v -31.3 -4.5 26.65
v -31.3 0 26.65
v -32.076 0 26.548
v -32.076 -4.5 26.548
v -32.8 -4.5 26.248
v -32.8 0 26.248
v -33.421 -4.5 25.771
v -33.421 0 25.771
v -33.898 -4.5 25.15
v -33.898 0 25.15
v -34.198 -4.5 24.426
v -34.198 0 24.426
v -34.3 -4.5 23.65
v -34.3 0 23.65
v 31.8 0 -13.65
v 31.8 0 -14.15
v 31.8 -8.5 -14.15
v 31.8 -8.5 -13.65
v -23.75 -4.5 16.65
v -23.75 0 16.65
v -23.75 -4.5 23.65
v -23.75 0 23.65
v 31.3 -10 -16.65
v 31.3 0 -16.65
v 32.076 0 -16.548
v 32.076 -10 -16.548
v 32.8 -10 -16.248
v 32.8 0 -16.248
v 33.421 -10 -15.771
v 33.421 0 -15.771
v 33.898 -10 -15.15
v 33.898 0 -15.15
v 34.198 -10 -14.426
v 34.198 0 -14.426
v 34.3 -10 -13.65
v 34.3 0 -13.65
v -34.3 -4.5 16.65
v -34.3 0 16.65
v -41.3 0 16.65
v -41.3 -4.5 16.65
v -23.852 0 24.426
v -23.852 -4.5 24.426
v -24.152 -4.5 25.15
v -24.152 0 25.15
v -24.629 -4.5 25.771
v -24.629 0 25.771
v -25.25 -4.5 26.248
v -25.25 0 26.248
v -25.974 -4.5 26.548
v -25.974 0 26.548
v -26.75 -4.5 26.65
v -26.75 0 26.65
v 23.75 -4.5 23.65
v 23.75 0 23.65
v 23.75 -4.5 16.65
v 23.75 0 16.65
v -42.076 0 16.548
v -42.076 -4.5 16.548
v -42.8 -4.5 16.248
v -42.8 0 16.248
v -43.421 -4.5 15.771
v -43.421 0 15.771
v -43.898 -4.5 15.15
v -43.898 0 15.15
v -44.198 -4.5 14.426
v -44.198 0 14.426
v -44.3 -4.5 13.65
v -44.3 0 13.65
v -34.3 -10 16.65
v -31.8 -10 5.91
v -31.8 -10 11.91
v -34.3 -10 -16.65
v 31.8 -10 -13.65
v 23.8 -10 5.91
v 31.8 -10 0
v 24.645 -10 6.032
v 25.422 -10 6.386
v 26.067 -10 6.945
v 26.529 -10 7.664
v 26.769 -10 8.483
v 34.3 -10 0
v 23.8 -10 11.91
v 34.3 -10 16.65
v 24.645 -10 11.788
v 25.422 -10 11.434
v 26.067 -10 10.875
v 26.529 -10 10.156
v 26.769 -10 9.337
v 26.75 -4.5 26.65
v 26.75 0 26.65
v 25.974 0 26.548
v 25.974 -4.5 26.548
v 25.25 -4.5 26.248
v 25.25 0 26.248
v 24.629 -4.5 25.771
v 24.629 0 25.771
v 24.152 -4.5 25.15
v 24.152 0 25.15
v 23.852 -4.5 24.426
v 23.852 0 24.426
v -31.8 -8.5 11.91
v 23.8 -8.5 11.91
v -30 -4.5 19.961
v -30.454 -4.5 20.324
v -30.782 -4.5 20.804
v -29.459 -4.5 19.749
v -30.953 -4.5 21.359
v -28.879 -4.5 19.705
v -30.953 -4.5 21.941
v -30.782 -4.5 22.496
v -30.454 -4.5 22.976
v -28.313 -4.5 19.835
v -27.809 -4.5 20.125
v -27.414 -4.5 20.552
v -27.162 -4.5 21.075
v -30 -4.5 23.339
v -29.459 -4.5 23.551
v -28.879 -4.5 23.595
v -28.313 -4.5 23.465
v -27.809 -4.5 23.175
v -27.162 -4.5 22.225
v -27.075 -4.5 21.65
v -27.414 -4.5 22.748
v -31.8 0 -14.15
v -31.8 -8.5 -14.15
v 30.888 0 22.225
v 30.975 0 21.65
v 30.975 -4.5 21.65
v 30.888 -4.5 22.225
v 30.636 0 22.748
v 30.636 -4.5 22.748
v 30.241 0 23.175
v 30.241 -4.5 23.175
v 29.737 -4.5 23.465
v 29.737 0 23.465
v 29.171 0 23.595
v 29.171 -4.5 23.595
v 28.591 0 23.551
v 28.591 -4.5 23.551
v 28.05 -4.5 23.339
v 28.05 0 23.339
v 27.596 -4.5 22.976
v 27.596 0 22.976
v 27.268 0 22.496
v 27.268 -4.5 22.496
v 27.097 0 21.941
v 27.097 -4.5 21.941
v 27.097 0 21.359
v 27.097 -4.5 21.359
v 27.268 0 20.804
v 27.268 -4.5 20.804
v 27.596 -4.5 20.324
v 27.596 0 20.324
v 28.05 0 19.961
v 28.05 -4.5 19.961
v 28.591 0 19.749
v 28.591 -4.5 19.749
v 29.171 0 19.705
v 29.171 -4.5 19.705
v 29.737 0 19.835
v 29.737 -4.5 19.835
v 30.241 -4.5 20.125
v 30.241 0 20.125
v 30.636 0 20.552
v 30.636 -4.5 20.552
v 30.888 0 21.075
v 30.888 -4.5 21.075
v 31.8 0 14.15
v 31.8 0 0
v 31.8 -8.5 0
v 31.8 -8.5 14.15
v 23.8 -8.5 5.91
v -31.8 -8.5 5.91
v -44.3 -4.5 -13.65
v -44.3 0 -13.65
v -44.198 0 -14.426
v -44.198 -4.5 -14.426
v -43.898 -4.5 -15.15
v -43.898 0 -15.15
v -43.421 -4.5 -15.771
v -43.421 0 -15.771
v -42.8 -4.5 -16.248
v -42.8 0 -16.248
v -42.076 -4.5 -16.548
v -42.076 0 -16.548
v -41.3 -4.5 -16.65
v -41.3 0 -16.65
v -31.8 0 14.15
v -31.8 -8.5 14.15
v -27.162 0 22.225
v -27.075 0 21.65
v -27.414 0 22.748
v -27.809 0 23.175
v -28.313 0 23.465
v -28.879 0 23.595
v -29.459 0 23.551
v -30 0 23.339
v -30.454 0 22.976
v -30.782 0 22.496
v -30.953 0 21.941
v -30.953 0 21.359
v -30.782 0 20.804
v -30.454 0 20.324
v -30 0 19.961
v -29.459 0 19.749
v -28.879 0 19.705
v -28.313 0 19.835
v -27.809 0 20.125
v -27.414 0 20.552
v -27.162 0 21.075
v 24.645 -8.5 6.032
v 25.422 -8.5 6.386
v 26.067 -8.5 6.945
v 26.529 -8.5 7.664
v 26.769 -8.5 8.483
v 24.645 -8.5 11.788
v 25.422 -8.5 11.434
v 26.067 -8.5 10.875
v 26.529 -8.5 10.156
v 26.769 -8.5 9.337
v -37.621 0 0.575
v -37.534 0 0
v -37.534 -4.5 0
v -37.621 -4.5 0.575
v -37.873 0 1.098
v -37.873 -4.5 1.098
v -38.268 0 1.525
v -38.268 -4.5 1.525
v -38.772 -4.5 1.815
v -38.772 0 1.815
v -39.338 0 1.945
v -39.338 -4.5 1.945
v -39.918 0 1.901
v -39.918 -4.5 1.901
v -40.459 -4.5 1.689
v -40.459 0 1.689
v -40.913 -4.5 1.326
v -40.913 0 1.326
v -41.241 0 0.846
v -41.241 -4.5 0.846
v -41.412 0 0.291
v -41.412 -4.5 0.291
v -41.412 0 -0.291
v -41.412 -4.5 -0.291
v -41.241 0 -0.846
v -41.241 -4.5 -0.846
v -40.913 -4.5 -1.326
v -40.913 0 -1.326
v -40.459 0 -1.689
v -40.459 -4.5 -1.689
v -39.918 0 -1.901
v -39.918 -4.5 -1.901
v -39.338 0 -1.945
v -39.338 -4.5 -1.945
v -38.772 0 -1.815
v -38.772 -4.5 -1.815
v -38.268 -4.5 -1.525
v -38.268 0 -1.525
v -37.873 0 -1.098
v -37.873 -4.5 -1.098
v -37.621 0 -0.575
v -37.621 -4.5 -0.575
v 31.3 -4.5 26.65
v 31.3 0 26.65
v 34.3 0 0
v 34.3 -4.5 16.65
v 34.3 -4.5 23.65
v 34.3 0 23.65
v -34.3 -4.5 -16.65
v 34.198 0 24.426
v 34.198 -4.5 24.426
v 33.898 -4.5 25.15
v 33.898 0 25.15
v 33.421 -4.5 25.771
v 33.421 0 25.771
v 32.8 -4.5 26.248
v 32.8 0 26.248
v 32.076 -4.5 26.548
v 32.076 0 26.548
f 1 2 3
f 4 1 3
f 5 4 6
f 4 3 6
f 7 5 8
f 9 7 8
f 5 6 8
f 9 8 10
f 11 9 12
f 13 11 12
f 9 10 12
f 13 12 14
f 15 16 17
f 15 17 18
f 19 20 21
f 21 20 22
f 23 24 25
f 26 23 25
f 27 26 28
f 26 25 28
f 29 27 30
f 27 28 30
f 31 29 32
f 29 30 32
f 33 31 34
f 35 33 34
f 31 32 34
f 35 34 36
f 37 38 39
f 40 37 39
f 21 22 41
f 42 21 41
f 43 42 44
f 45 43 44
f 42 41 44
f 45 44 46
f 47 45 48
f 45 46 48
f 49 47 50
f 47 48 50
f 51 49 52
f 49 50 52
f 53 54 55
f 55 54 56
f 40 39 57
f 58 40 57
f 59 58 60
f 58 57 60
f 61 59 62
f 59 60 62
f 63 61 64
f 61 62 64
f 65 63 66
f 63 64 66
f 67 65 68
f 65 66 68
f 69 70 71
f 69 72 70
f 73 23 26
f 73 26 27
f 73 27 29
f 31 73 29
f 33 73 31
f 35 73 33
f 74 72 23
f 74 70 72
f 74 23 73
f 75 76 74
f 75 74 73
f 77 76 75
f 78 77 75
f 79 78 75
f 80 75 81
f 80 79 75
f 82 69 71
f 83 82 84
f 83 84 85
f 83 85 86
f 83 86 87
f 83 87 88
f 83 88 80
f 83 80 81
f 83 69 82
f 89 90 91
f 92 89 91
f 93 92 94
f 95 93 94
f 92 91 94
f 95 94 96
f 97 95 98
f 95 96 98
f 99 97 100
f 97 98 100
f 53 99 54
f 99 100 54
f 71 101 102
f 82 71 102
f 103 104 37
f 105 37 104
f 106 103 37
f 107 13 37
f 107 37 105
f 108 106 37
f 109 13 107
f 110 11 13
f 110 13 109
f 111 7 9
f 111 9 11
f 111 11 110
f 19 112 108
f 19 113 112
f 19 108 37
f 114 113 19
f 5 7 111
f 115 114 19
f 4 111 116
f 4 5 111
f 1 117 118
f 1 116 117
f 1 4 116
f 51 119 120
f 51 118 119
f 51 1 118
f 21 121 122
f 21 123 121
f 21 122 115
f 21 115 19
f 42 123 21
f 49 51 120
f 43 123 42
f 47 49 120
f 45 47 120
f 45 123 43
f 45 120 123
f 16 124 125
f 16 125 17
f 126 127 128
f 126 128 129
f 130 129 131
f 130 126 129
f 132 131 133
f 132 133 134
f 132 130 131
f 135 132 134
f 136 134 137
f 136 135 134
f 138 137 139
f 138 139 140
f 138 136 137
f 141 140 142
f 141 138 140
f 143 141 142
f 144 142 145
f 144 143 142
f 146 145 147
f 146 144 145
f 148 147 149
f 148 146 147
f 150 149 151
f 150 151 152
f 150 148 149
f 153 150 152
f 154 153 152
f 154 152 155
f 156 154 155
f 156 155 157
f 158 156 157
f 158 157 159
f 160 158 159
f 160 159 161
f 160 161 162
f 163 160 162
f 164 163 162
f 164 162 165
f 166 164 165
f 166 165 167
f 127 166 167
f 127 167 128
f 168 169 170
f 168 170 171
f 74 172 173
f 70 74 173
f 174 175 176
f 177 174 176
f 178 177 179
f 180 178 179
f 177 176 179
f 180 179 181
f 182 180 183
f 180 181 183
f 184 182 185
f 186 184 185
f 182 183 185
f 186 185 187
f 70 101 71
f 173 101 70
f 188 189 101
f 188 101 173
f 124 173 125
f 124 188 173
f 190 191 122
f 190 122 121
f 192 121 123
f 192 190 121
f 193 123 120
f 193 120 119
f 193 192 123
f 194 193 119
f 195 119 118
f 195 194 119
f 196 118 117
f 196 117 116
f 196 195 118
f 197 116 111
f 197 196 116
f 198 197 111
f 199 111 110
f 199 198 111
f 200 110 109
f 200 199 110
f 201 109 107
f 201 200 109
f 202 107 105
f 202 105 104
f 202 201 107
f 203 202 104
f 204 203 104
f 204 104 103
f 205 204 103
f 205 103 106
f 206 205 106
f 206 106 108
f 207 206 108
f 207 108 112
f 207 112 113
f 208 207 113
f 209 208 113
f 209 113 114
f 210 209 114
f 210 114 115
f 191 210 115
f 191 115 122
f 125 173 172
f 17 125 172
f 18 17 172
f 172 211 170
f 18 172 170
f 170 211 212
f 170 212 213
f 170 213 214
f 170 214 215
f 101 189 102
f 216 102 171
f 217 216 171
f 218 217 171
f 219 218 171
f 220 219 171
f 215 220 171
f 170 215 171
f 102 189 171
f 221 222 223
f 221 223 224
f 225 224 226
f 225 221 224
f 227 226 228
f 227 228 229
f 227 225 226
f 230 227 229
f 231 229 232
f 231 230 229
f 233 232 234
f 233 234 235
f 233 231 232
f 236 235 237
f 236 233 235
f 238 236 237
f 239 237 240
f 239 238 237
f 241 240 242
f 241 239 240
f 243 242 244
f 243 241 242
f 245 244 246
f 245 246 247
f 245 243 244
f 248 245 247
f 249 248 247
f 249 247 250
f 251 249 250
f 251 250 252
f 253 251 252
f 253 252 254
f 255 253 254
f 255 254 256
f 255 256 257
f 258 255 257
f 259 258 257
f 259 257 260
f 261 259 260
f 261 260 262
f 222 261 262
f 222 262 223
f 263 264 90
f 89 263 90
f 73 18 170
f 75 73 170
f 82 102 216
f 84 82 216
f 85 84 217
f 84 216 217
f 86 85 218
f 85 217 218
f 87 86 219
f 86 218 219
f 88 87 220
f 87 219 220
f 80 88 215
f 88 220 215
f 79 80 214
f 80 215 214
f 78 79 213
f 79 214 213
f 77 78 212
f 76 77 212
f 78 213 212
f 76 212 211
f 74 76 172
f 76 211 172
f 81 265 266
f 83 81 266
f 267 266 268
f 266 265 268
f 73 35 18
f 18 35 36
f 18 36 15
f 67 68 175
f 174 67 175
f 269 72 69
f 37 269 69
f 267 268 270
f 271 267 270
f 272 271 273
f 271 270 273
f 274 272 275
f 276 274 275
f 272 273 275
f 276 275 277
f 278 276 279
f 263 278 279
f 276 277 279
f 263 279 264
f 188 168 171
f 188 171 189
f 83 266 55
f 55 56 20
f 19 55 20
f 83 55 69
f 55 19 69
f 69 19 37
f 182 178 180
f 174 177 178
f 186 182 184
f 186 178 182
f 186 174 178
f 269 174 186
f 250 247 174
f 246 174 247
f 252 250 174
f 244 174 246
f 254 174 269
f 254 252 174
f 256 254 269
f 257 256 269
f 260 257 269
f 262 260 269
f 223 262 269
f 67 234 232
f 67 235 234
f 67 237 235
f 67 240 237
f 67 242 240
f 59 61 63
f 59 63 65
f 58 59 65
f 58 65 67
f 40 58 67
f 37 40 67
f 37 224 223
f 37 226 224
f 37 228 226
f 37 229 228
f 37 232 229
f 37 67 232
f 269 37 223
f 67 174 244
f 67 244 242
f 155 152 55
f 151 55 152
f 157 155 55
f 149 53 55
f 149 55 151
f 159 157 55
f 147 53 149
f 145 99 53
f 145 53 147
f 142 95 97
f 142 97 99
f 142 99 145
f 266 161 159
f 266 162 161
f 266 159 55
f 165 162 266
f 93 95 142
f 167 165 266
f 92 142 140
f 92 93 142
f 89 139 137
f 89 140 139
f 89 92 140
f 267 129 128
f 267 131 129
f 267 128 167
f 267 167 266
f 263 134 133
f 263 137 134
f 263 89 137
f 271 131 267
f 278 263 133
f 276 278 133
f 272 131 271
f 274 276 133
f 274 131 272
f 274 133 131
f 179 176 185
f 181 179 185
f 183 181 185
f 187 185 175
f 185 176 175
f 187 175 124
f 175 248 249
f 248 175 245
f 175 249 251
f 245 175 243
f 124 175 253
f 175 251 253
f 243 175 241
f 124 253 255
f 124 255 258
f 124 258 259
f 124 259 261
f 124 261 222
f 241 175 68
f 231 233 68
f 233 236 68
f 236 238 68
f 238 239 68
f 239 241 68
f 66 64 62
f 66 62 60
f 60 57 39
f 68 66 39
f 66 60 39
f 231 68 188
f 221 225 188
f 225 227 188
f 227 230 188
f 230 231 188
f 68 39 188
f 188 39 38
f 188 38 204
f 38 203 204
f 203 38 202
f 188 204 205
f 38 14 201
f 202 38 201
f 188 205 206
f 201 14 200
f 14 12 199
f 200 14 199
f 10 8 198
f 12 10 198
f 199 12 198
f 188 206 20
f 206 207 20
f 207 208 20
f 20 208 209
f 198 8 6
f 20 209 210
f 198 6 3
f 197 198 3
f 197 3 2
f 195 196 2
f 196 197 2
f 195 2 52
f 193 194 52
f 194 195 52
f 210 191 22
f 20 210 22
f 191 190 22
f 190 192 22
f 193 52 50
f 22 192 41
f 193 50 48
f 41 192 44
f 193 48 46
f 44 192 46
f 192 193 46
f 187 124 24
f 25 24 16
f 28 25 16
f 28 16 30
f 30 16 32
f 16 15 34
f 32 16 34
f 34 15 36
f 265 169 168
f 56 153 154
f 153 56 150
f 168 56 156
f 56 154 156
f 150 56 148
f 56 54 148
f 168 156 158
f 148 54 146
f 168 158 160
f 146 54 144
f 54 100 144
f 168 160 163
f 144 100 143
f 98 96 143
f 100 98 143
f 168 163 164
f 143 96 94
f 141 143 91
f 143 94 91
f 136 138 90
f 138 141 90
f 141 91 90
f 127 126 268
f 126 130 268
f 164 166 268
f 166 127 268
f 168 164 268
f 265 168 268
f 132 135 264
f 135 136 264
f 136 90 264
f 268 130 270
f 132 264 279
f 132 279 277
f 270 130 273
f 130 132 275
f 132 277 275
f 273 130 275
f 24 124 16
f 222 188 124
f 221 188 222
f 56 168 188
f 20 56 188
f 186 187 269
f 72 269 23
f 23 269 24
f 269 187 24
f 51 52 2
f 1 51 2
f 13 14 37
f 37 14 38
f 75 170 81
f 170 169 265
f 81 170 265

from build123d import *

# Parameters (mm, degrees)
F0_R     = 1.95
F1_DEPTH = 10
F2_DEPTH = 8.5
F3_R     = 1.95
F4_DEPTH = 5.5
F6_DEPTH = 25


with BuildPart() as f1:
    # F0 (on Front) → F1 (new body)
    with BuildSketch(Plane.XZ):
        with BuildLine():
            Line((-34.3, 23.65), (-34.3, 16.65))
            Line((-34.3, 16.65), (-23.75, 16.65))
            Line((-23.75, 16.65), (-23.75, 23.65))
            ThreePointArc((-23.75, 23.65), (-24.62868, 25.77132), (-26.75, 26.65))
            Line((-26.75, 26.65), (-31.3, 26.65))
            ThreePointArc((-31.3, 26.65), (-33.42132, 25.77132), (-34.3, 23.65))
        make_face()
        with Locations((-29.025, 21.65)):
            Circle(F0_R, mode=Mode.SUBTRACT)
        with BuildLine():
            Line((23.75, 16.65), (34.3, 16.65))
            Line((34.3, 16.65), (34.3, 23.65))
            ThreePointArc((34.3, 23.65), (33.42132, 25.77132), (31.3, 26.65))
            Line((31.3, 26.65), (26.75, 26.65))
            ThreePointArc((26.75, 26.65), (24.62868, 25.77132), (23.75, 23.65))
            Line((23.75, 23.65), (23.75, 16.65))
        make_face()
        with Locations((29.025, 21.65)):
            Circle(F0_R, mode=Mode.SUBTRACT)
        with BuildLine():
            Line((34.3, 16.65), (34.3, 6.1))
            Line((34.3, 6.1), (41.3, 6.1))
            ThreePointArc((41.3, 6.1), (43.42132, 6.97868), (44.3, 9.1))
            Line((44.3, 9.1), (44.3, 13.65))
            ThreePointArc((44.3, 13.65), (43.42132, 15.77132), (41.3, 16.65))
            Line((41.3, 16.65), (34.3, 16.65))
        make_face()
        with Locations((39.3, 11.375)):
            Circle(F0_R, mode=Mode.SUBTRACT)
        with BuildLine():
            Line((-31.8, 11.91), (-31.8, 14.15))
            Line((-31.8, 14.15), (31.8, 14.15))
            Line((31.8, 14.15), (31.8, 0))
            Line((31.8, 0), (34.3, 0))
            Line((34.3, 0), (34.3, 6.1))
            Line((34.3, 6.1), (34.3, 16.65))
            Line((34.3, 16.65), (23.75, 16.65))
            Line((23.75, 16.65), (-23.75, 16.65))
            Line((-23.75, 16.65), (-34.3, 16.65))
            Line((-34.3, 16.65), (-34.3, -16.65))
            Line((-34.3, -16.65), (31.3, -16.65))
            ThreePointArc((31.3, -16.65), (33.42132, -15.77132), (34.3, -13.65))
            Line((34.3, -13.65), (31.8, -13.65))
            Line((31.8, -13.65), (31.8, -14.15))
            Line((31.8, -14.15), (-31.8, -14.15))
            Line((-31.8, -14.15), (-31.8, 5.91))
            Line((-31.8, 5.91), (-31.8, 11.91))
        make_face()
        with BuildLine():
            Line((-41.3, -16.65), (-34.3, -16.65))
            Line((-34.3, -16.65), (-34.3, 16.65))
            Line((-34.3, 16.65), (-41.3, 16.65))
            ThreePointArc((-41.3, 16.65), (-43.42132, 15.77132), (-44.3, 13.65))
            Line((-44.3, 13.65), (-44.3, -13.65))
            ThreePointArc((-44.3, -13.65), (-43.42132, -15.77132), (-41.3, -16.65))
        make_face()
        with Locations((-39.483927, 0)):
            Circle(F0_R, mode=Mode.SUBTRACT)
        with BuildLine():
            Line((31.8, 14.15), (-31.8, 14.15))
            Line((-31.8, 14.15), (-31.8, 11.91))
            Line((-31.8, 11.91), (23.8, 11.91))
            ThreePointArc((23.8, 11.91), (26.8, 8.91), (23.8, 5.91))
            Line((23.8, 5.91), (-31.8, 5.91))
            Line((-31.8, 5.91), (-31.8, -14.15))
            Line((-31.8, -14.15), (31.8, -14.15))
            Line((31.8, -14.15), (31.8, -13.65))
            Line((31.8, -13.65), (31.8, 0))
            Line((31.8, 0), (31.8, 14.15))
        make_face()
    extrude(amount=F1_DEPTH)

    # F0 (on Front) → F2 (cut)
    with BuildSketch(Plane.XZ):
        with BuildLine():
            Line((31.8, 14.15), (-31.8, 14.15))
            Line((-31.8, 14.15), (-31.8, 11.91))
            Line((-31.8, 11.91), (23.8, 11.91))
            ThreePointArc((23.8, 11.91), (26.8, 8.91), (23.8, 5.91))
            Line((23.8, 5.91), (-31.8, 5.91))
            Line((-31.8, 5.91), (-31.8, -14.15))
            Line((-31.8, -14.15), (31.8, -14.15))
            Line((31.8, -14.15), (31.8, -13.65))
            Line((31.8, -13.65), (31.8, 0))
            Line((31.8, 0), (31.8, 14.15))
        make_face()
    extrude(amount=F2_DEPTH, mode=Mode.SUBTRACT)

    # F3 (on face) → F4 (cut)
    with BuildSketch(Plane.XZ.offset(10)):
        with BuildLine():
            ThreePointArc((-31.3, 26.65), (-33.42132, 25.77132), (-34.3, 23.65))
            Line((-34.3, 23.65), (-34.3, 16.65))
            Line((-34.3, 16.65), (-23.75, 16.65))
            Line((-23.75, 16.65), (-23.75, 23.65))
            ThreePointArc((-23.75, 23.65), (-24.62868, 25.77132), (-26.75, 26.65))
            Line((-26.75, 26.65), (-31.3, 26.65))
        make_face()
        with Locations((-29.025, 21.65)):
            Circle(F3_R, mode=Mode.SUBTRACT)
        with BuildLine():
            Line((-34.3, -16.65), (-34.3, 16.65))
            Line((-34.3, 16.65), (-41.3, 16.65))
            ThreePointArc((-41.3, 16.65), (-43.42132, 15.77132), (-44.3, 13.65))
            Line((-44.3, 13.65), (-44.3, -13.65))
            ThreePointArc((-44.3, -13.65), (-43.42132, -15.77132), (-41.3, -16.65))
            Line((-41.3, -16.65), (-34.3, -16.65))
        make_face()
        with Locations((-39.483927, 0)):
            Circle(F3_R, mode=Mode.SUBTRACT)
        with BuildLine():
            Line((23.75, 23.65), (23.75, 16.65))
            Line((23.75, 16.65), (34.3, 16.65))
            Line((34.3, 16.65), (34.3, 23.65))
            ThreePointArc((34.3, 23.65), (33.42132, 25.77132), (31.3, 26.65))
            Line((31.3, 26.65), (26.75, 26.65))
            ThreePointArc((26.75, 26.65), (24.62868, 25.77132), (23.75, 23.65))
        make_face()
        with Locations((29.025, 21.65)):
            Circle(F3_R, mode=Mode.SUBTRACT)
        with BuildLine():
            Line((41.3, 16.65), (34.3, 16.65))
            Line((34.3, 16.65), (34.3, 6.1))
            Line((34.3, 6.1), (41.3, 6.1))
            ThreePointArc((41.3, 6.1), (43.42132, 6.97868), (44.3, 9.1))
            Line((44.3, 9.1), (44.3, 13.65))
            ThreePointArc((44.3, 13.65), (43.42132, 15.77132), (41.3, 16.65))
        make_face()
        with Locations((39.3, 11.375)):
            Circle(F3_R, mode=Mode.SUBTRACT)
    extrude(amount=-F4_DEPTH, mode=Mode.SUBTRACT)

    # F5 (on face) → F6 (cut)
    with BuildSketch(Plane.XZ):
        Polygon((52.0982, 24.629619), (34.3, 23.65), (34.3, 16.65), (34.3, 0), (53.583535, -2.356674), align=None)
    extrude(amount=F6_DEPTH, mode=Mode.SUBTRACT)


solid = f1.part
